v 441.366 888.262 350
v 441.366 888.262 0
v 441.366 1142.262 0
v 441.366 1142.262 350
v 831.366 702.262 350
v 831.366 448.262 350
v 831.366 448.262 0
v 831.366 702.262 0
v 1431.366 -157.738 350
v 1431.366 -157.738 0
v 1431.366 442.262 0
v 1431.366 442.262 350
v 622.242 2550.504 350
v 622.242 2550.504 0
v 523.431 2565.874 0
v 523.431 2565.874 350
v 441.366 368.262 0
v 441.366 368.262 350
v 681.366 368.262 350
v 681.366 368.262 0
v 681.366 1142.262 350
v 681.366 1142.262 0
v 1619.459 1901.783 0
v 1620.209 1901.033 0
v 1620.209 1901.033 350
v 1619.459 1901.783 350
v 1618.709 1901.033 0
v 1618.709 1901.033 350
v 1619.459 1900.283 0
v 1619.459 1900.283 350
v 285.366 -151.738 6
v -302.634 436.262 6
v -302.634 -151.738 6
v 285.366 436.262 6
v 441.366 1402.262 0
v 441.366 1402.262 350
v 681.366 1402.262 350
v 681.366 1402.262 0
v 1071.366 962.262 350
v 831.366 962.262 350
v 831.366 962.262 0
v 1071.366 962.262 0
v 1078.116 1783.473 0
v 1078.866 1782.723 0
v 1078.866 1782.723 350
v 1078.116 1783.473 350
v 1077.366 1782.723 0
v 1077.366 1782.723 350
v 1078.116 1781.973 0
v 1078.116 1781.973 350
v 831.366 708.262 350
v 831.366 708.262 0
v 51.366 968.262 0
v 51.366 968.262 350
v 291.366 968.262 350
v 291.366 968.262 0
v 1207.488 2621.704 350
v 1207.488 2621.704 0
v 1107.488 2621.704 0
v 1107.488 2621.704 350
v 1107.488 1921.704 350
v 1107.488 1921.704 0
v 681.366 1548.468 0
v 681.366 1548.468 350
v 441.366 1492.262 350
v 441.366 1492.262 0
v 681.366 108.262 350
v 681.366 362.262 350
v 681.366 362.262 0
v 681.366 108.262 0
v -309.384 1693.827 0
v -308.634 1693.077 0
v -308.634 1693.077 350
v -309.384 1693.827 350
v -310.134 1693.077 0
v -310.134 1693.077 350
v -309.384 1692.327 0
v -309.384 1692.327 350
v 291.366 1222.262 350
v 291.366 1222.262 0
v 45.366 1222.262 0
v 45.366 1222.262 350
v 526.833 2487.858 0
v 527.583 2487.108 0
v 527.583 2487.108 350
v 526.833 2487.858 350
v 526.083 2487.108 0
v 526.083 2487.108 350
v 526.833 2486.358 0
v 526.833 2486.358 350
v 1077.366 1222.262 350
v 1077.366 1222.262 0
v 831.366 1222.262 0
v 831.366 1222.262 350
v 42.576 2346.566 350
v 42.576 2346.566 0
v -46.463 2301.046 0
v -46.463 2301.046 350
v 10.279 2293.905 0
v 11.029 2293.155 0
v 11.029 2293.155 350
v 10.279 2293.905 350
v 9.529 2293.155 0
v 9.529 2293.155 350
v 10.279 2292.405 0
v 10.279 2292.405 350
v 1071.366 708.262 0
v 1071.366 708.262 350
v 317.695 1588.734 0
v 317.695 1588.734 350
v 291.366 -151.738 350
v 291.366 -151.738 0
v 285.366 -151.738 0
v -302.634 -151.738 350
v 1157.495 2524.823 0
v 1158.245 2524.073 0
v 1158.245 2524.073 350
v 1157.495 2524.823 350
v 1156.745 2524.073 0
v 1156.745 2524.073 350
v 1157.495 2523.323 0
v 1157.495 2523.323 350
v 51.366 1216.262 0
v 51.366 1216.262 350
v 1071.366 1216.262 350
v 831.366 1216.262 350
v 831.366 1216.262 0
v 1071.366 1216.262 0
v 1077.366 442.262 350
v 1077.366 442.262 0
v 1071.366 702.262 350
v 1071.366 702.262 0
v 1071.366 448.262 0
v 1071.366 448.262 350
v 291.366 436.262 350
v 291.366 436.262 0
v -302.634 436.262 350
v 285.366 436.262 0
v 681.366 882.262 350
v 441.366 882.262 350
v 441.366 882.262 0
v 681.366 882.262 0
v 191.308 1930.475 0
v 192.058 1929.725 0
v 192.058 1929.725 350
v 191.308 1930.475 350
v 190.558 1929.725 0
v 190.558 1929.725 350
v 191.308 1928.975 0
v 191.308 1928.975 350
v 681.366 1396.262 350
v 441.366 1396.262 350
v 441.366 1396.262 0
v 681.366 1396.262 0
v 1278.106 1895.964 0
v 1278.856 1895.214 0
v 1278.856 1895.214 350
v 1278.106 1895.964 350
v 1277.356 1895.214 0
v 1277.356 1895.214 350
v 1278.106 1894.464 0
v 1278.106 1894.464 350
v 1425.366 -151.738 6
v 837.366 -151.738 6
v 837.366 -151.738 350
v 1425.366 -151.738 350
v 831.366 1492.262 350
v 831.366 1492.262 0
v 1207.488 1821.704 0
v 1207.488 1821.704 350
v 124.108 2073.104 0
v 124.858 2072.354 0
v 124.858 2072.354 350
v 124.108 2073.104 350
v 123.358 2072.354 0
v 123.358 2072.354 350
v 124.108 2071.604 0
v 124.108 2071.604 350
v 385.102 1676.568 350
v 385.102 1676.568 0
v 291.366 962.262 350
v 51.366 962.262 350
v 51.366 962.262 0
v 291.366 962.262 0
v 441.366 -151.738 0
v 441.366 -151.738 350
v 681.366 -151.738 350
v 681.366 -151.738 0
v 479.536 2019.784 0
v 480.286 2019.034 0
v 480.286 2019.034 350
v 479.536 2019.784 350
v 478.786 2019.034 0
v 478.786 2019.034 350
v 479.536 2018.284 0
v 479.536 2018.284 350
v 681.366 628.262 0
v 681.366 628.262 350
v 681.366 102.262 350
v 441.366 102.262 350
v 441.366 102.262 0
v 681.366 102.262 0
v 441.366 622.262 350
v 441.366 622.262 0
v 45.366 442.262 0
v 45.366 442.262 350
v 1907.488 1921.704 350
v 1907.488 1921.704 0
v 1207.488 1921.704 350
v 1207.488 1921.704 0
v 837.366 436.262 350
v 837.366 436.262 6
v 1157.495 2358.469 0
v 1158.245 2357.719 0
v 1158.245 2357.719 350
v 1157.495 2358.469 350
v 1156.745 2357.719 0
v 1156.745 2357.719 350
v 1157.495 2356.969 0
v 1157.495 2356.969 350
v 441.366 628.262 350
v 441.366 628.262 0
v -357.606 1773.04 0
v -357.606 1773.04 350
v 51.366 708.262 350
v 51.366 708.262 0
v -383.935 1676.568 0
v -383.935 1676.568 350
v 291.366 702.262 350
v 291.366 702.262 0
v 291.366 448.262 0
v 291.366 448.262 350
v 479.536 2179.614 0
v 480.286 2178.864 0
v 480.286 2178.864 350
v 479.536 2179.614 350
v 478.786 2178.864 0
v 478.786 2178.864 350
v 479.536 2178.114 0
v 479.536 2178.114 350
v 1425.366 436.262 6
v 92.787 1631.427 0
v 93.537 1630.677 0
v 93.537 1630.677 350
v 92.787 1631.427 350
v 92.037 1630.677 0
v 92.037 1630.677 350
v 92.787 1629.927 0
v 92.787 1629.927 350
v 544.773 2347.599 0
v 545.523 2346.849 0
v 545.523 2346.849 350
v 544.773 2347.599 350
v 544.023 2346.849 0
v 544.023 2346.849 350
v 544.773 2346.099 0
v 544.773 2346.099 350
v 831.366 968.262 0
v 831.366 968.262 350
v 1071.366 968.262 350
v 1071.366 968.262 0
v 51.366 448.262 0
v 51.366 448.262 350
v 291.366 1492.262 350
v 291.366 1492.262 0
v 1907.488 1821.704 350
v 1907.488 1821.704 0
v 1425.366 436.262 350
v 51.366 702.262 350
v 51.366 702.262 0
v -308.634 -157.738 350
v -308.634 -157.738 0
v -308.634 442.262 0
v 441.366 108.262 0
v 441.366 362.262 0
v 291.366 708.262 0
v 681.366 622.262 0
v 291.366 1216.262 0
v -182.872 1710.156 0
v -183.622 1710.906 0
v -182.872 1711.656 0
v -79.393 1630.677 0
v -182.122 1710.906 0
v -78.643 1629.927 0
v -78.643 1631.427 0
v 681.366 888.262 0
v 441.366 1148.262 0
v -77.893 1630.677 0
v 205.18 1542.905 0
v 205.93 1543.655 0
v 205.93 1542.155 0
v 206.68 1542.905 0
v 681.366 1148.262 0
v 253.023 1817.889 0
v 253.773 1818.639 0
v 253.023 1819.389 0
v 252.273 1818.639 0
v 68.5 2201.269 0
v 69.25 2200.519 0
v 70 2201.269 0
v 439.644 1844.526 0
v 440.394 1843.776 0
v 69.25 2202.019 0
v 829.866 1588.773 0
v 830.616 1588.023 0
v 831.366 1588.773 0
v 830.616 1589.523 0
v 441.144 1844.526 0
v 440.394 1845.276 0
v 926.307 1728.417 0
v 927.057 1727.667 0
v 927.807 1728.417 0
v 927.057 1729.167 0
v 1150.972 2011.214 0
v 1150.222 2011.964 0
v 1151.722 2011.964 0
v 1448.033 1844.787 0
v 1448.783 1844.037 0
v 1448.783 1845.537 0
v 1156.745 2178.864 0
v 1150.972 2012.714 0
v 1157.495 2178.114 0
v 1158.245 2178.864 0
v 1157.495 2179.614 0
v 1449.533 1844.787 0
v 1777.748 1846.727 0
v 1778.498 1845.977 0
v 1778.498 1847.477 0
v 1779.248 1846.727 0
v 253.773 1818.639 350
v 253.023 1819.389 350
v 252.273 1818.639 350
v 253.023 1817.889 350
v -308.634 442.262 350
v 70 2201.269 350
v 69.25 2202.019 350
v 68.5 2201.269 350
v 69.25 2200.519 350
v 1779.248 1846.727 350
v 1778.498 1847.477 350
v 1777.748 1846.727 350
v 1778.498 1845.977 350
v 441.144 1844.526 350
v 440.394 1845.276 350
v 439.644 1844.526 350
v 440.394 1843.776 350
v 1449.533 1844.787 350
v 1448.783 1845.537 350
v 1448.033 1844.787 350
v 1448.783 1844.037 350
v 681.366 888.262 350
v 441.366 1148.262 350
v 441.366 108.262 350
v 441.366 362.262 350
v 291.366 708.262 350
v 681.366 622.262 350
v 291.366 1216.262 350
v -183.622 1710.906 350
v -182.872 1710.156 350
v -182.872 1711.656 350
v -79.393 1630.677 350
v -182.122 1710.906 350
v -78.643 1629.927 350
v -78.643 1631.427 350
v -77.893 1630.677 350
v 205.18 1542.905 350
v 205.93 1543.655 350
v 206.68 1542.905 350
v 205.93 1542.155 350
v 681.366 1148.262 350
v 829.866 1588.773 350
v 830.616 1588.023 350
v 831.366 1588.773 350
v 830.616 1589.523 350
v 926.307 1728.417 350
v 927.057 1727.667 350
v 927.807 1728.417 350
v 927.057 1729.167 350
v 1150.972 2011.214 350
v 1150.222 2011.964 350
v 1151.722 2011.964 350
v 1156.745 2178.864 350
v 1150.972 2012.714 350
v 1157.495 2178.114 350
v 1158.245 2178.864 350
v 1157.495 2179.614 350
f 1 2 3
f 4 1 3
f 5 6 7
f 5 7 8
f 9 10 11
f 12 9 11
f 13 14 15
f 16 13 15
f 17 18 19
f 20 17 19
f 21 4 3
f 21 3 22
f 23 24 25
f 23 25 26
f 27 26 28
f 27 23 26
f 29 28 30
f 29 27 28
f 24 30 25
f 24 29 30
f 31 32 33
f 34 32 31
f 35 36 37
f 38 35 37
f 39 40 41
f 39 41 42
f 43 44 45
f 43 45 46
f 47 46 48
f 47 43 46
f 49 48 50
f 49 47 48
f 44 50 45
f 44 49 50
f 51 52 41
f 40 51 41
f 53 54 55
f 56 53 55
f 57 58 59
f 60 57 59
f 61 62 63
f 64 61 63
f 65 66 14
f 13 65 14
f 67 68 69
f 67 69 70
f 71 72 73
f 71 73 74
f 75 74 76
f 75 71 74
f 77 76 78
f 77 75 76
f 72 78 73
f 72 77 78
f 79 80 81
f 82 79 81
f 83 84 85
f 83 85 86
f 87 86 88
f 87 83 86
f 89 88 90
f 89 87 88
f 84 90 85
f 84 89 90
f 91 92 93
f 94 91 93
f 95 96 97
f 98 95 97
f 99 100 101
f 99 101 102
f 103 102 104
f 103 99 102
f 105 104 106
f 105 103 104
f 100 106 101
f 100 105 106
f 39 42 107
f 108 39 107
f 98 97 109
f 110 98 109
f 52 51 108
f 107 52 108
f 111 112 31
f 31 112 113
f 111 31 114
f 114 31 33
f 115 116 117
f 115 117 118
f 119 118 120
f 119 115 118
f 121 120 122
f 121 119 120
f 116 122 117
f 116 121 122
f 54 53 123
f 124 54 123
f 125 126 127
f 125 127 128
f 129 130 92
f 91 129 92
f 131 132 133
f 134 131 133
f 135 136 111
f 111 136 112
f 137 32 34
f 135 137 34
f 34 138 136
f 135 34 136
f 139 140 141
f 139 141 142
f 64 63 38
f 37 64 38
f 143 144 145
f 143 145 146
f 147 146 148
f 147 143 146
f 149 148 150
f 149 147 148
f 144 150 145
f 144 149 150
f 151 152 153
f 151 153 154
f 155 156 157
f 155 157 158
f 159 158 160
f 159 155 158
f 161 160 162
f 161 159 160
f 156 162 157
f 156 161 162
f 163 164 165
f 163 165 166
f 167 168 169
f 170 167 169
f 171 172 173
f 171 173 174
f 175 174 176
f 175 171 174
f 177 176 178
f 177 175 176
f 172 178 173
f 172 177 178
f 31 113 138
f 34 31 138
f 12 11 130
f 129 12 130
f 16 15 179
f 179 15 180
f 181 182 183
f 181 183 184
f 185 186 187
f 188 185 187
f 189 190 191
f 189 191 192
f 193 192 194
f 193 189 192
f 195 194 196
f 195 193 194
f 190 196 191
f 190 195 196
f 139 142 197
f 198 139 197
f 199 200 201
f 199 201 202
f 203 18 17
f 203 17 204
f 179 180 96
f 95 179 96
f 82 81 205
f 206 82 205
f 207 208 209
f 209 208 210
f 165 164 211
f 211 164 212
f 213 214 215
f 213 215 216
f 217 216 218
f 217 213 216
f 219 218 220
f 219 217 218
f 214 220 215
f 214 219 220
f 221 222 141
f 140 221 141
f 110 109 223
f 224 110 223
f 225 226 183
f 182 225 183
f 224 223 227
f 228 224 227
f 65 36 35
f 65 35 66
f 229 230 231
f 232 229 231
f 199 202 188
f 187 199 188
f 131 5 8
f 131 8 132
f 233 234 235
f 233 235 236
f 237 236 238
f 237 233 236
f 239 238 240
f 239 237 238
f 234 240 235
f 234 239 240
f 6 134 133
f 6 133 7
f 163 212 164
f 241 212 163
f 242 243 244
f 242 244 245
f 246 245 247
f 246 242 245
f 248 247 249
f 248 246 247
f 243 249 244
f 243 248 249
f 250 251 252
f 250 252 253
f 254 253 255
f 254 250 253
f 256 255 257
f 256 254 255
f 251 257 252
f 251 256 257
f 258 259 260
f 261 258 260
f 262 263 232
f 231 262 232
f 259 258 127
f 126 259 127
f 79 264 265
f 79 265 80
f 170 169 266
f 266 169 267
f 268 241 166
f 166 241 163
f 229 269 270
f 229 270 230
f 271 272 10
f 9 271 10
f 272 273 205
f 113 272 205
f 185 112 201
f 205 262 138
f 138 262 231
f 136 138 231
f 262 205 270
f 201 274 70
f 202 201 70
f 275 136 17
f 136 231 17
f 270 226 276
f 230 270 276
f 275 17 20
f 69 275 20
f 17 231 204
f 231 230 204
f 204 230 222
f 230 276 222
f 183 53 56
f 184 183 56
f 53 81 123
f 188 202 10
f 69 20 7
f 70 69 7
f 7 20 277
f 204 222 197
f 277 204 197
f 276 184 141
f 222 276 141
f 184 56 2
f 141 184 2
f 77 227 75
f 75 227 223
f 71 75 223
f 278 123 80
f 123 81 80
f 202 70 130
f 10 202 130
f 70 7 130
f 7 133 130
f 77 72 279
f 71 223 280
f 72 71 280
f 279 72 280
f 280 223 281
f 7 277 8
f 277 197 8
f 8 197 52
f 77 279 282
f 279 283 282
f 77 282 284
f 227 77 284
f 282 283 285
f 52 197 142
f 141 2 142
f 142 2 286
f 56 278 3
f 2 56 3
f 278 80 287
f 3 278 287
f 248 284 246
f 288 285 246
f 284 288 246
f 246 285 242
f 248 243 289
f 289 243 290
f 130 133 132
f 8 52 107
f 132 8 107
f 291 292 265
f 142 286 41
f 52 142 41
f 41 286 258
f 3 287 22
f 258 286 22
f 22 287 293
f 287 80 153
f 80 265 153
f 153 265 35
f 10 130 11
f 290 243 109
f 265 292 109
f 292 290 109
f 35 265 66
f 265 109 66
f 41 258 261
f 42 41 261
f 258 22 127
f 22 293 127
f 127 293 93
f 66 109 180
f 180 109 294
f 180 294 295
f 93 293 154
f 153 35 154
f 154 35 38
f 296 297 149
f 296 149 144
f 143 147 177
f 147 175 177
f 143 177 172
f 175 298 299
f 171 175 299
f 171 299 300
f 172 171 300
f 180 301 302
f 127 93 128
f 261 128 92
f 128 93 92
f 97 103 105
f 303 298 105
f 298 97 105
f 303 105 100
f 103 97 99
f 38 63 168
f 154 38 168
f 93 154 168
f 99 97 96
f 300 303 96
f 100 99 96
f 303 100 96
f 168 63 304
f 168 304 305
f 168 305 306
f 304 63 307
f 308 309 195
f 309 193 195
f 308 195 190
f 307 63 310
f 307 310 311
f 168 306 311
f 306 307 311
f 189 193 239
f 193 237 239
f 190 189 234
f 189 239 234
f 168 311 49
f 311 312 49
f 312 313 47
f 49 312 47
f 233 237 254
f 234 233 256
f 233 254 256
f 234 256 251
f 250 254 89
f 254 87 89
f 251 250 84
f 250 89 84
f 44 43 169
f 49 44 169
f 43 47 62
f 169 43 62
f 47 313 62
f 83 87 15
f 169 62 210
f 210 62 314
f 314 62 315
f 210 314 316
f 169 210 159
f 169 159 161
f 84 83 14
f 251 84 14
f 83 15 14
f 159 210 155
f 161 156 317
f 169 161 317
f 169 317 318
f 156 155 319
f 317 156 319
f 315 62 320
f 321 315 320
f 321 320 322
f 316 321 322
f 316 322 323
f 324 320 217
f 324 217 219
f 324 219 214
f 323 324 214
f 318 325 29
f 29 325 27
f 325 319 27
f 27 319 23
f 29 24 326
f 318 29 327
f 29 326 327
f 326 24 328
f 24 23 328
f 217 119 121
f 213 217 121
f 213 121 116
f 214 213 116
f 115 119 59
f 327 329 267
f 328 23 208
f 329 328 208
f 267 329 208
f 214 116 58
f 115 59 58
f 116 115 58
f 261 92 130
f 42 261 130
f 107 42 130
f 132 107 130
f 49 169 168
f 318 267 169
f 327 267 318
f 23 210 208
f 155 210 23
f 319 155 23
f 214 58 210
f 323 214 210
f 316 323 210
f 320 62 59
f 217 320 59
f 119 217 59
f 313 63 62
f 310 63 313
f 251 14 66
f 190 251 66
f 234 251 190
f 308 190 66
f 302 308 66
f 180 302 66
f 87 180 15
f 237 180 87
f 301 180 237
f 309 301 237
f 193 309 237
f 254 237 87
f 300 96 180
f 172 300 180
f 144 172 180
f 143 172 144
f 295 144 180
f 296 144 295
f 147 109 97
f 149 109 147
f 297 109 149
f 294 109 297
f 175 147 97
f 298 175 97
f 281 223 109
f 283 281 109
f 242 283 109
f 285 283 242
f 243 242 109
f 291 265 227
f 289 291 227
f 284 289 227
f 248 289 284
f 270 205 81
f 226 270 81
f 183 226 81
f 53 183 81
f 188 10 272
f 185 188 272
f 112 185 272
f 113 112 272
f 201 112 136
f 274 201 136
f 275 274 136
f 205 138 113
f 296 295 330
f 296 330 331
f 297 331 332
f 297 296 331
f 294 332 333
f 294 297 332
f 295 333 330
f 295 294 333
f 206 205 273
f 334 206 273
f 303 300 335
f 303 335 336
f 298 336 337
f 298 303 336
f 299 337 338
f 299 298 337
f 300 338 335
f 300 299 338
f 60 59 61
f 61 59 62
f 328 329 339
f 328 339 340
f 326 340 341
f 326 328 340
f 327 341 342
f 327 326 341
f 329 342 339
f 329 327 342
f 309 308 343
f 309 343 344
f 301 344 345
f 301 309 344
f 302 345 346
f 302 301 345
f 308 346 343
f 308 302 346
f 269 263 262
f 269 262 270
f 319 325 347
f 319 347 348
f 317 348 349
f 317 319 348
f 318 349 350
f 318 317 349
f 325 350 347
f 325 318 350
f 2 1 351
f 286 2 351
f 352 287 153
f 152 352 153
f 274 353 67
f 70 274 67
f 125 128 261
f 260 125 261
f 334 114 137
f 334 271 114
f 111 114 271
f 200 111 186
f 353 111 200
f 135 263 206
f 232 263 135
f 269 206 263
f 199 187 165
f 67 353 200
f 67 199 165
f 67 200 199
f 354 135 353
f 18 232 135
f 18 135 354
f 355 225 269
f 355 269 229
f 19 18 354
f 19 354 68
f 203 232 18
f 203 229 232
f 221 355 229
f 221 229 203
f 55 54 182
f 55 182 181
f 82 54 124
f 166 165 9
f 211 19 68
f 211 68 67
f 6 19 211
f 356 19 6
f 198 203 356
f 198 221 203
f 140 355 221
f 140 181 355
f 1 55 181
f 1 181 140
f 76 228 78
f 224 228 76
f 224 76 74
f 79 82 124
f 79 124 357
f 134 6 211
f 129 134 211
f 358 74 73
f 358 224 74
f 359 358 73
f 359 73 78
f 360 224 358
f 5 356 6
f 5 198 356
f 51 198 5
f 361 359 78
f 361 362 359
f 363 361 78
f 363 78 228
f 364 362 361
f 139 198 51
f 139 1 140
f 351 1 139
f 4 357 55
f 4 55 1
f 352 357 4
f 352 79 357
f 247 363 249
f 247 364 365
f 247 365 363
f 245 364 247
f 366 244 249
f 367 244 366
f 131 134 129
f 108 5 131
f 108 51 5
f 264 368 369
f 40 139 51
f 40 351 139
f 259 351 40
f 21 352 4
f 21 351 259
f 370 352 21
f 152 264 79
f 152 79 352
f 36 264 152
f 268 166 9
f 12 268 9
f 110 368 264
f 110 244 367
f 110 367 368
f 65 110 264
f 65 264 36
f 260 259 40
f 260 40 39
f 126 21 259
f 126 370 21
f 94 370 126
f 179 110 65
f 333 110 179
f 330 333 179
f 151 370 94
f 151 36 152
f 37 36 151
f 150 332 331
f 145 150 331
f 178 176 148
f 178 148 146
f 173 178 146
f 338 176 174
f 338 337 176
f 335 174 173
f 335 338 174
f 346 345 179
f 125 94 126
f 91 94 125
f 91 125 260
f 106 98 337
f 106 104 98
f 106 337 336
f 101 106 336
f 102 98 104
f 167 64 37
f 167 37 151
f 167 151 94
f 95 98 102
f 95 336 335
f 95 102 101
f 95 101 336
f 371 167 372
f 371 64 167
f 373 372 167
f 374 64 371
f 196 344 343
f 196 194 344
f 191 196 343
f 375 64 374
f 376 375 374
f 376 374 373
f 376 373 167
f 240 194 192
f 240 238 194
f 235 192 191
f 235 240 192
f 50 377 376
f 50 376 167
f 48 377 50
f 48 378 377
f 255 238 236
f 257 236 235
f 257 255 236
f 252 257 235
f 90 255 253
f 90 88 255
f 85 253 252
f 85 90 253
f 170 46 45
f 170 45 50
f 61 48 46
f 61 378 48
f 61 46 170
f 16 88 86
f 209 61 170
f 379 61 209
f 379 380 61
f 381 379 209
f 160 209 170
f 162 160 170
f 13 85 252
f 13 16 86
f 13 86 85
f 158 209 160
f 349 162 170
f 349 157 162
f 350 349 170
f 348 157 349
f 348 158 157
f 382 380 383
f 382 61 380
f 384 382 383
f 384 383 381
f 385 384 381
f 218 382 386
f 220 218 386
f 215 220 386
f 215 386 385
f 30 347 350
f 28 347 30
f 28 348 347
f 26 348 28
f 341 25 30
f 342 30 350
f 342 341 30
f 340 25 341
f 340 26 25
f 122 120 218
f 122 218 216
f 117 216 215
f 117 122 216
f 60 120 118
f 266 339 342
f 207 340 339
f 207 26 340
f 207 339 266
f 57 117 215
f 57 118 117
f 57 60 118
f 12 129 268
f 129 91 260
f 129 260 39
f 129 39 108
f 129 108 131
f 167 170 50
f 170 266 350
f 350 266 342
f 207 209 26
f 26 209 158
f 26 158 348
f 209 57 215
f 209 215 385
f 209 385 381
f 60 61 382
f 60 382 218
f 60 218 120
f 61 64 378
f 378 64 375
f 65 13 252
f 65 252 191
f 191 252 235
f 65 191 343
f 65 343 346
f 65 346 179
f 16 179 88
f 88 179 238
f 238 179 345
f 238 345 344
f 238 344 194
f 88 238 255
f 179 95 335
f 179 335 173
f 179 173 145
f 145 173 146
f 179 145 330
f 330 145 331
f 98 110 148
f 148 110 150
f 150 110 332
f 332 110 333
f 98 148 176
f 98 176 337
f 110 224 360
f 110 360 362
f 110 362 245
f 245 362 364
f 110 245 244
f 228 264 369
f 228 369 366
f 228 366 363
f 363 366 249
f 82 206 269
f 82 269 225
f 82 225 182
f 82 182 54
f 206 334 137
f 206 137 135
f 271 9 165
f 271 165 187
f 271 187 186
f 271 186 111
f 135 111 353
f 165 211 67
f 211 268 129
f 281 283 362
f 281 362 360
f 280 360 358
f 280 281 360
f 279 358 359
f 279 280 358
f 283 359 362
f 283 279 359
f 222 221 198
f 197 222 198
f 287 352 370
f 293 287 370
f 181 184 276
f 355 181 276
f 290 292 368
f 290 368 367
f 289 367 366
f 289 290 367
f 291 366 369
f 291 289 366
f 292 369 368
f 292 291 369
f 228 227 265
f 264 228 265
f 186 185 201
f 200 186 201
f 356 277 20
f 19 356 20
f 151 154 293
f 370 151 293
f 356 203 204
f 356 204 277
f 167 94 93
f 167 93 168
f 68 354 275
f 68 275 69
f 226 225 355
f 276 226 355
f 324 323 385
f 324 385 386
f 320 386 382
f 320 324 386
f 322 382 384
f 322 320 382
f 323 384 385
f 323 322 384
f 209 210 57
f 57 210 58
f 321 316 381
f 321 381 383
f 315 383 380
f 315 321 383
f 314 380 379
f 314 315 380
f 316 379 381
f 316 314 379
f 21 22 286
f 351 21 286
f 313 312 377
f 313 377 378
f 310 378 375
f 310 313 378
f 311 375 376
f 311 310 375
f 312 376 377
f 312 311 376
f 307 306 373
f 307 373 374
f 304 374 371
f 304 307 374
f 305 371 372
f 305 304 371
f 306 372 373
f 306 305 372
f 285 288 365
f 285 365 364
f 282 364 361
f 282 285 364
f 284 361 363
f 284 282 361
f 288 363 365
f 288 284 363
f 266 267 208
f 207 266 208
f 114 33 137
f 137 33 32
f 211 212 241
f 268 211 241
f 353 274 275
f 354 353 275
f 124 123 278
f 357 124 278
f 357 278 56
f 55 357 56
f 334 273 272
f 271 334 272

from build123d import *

# Parameters (mm, degrees)
F0_W     = 588
F0_H     = 6
F0_W_2   = 240
F0_R     = 0.75
F1_DEPTH = 350
F0_H_2   = 588
F2_DEPTH = 6


with BuildPart() as f1:
    # F0 (on Top) → F1 (new body)
    with BuildSketch(Plane.XY):
        with Locations((1131.3658022881, -154.7376276255)):
            Rectangle(F0_W, F0_H)
        Polygon((831.3658022881, 442.2623723745), (831.3658022881, -157.7376276255), (837.3658022881, -157.7376276255), (837.3658022881, -151.7376276255), (837.3658022881, 436.2623723745), (837.3658022881, 442.2623723745), align=None)
        Polygon((285.3658022881, 436.2623723745), (291.3658022881, 436.2623723745), (291.3658022881, 442.2623723745), (51.3658022881, 442.2623723745), (45.3658022881, 442.2623723745), (-302.6341977119, 442.2623723745), (-302.6341977119, 436.2623723745), align=None)
        with Locations((951.3658022881, 1219.2623723745)):
            Rectangle(F0_W_2, F0_H)
        Polygon((-308.6341977119, -157.7376276255), (-302.6341977119, -157.7376276255), (-302.6341977119, -151.7376276255), (-302.6341977119, 436.2623723745), (-302.6341977119, 442.2623723745), (-308.6341977119, 442.2623723745), align=None)
        Polygon((-302.6341977119, -157.7376276255), (291.3658022881, -157.7376276255), (291.3658022881, -151.7376276255), (285.3658022881, -151.7376276255), (-302.6341977119, -151.7376276255), align=None)
        Polygon((1071.3658022881, 442.2623723745), (837.3658022881, 442.2623723745), (837.3658022881, 436.2623723745), (1425.3658022881, 436.2623723745), (1431.3658022881, 436.2623723745), (1431.3658022881, 442.2623723745), (1077.3658022881, 442.2623723745), align=None)
        Polygon((291.3658022881, -151.7376276255), (291.3658022881, -157.7376276255), (441.3658022881, -157.7376276255), (441.3658022881, -151.7376276255), (441.3658022881, 102.2623723745), (441.3658022881, 108.2623723745), (441.3658022881, 362.2623723745), (441.3658022881, 368.2623723745), (441.3658022881, 622.2623723745), (441.3658022881, 628.2623723745), (441.3658022881, 882.2623723745), (441.3658022881, 888.2623723745), (441.3658022881, 1142.2623723745), (441.3658022881, 1148.2623723745), (441.3658022881, 1396.2623723745), (441.3658022881, 1402.2623723745), (441.3658022881, 1492.2623723745), (291.3658022881, 1492.2623723745), (291.3658022881, 1222.2623723745), (291.3658022881, 1216.2623723745), (291.3658022881, 968.2623723745), (291.3658022881, 962.2623723745), (291.3658022881, 708.2623723745), (291.3658022881, 702.2623723745), (291.3658022881, 448.2623723745), (291.3658022881, 442.2623723745), (291.3658022881, 436.2623723745), align=None)
        with Locations((171.3658022881, 1219.2623723745)):
            Rectangle(F0_W_2, F0_H)
        Polygon((1425.3658022881, -151.7376276255), (1425.3658022881, -157.7376276255), (1431.3658022881, -157.7376276255), (1431.3658022881, 436.2623723745), (1425.3658022881, 436.2623723745), align=None)
        with Locations((561.3658022881, -154.7376276255)):
            Rectangle(F0_W_2, F0_H)
        Polygon((681.3658022881, -151.7376276255), (681.3658022881, -157.7376276255), (831.3658022881, -157.7376276255), (831.3658022881, 442.2623723745), (831.3658022881, 448.2623723745), (831.3658022881, 702.2623723745), (831.3658022881, 708.2623723745), (831.3658022881, 962.2623723745), (831.3658022881, 968.2623723745), (831.3658022881, 1216.2623723745), (831.3658022881, 1222.2623723745), (831.3658022881, 1492.2623723745), (681.3658022881, 1492.2623723745), (681.3658022881, 1402.2623723745), (681.3658022881, 1396.2623723745), (681.3658022881, 1148.2623723745), (681.3658022881, 1142.2623723745), (681.3658022881, 888.2623723745), (681.3658022881, 882.2623723745), (681.3658022881, 628.2623723745), (681.3658022881, 622.2623723745), (681.3658022881, 368.2623723745), (681.3658022881, 362.2623723745), (681.3658022881, 108.2623723745), (681.3658022881, 102.2623723745), (681.3658022881, 7.2623723745), align=None)
        Polygon((-383.9351642411, 1676.5681091402), (291.3658022881, 1492.2623723745), (441.3658022881, 1492.2623723745), (622.2423832578, 2550.5042054476), (523.4306083625, 2565.8740831976), (385.101708613, 1676.5681091402), (42.5764871887, 2346.5661747919), (-46.4625771205, 2301.046453495), (317.6951932546, 1588.7339390216), (-357.6057732746, 1773.0396757873), align=None)
        with Locations((-309.3841977119, 1693.0772066116)):
            Circle(F0_R, mode=Mode.SUBTRACT)
        with Locations((-182.871773839, 1710.9059095383)):
            Circle(F0_R, mode=Mode.SUBTRACT)
        with Locations((-78.6427035928, 1630.676984787)):
            Circle(F0_R, mode=Mode.SUBTRACT)
        with Locations((92.7866697311, 1630.676984787)):
            Circle(F0_R, mode=Mode.SUBTRACT)
        with Locations((205.9300839901, 1542.9050922394)):
            Circle(F0_R, mode=Mode.SUBTRACT)
        with Locations((253.0225515366, 1818.6388015747)):
            Circle(F0_R, mode=Mode.SUBTRACT)
        with Locations((440.3941631317, 1844.5258140564)):
            Circle(F0_R, mode=Mode.SUBTRACT)
        with Locations((124.1076514125, 2072.3543167114)):
            Circle(F0_R, mode=Mode.SUBTRACT)
        with Locations((69.2502483726, 2201.2691497803)):
            Circle(F0_R, mode=Mode.SUBTRACT)
        with Locations((10.2785266936, 2293.1554317474)):
            Circle(F0_R, mode=Mode.SUBTRACT)
        with Locations((191.3079619408, 1929.7250509262)):
            Circle(F0_R, mode=Mode.SUBTRACT)
        with Locations((479.5362651348, 2019.0343856812)):
            Circle(F0_R, mode=Mode.SUBTRACT)
        with Locations((479.5362651348, 2178.8644790649)):
            Circle(F0_R, mode=Mode.SUBTRACT)
        with Locations((544.7731018066, 2346.8494415283)):
            Circle(F0_R, mode=Mode.SUBTRACT)
        with Locations((526.8329381943, 2487.1084690094)):
            Circle(F0_R, mode=Mode.SUBTRACT)
        Polygon((1071.3658022881, 702.2623723745), (1071.3658022881, 448.2623723745), (1071.3658022881, 442.2623723745), (1077.3658022881, 442.2623723745), (1077.3658022881, 1222.2623723745), (1071.3658022881, 1222.2623723745), (1071.3658022881, 1216.2623723745), (1071.3658022881, 968.2623723745), (1071.3658022881, 962.2623723745), (1071.3658022881, 708.2623723745), align=None)
        Polygon((681.3658022881, 1492.2623723745), (831.3658022881, 1492.2623723745), (1207.488313467, 1821.7041071084), (1907.488313467, 1821.7041071084), (1907.488313467, 1921.7041071084), (1207.488313467, 1921.7041071084), (1207.488313467, 2621.7041071084), (1107.488313467, 2621.7041071084), (1107.488313467, 1921.7041071084), (681.3658022881, 1548.4679005014), align=None)
        with Locations((830.6158022881, 1588.7731313705)):
            Circle(F0_R, mode=Mode.SUBTRACT)
        with Locations((927.0566105843, 1728.4172773361)):
            Circle(F0_R, mode=Mode.SUBTRACT)
        with Locations((1078.1158022881, 1782.7233076096)):
            Circle(F0_R, mode=Mode.SUBTRACT)
        with Locations((1278.1064510345, 1895.2144384384)):
            Circle(F0_R, mode=Mode.SUBTRACT)
        with Locations((1448.7826824188, 1844.7873592377)):
            Circle(F0_R, mode=Mode.SUBTRACT)
        with Locations((1619.4587945938, 1901.0329246521)):
            Circle(F0_R, mode=Mode.SUBTRACT)
        with Locations((1778.4979343414, 1846.7268943787)):
            Circle(F0_R, mode=Mode.SUBTRACT)
        with Locations((1150.971531868, 2011.9640827179)):
            Circle(F0_R, mode=Mode.SUBTRACT)
        with Locations((1157.4952602386, 2178.8644790649)):
            Circle(F0_R, mode=Mode.SUBTRACT)
        with Locations((1157.4952602386, 2357.7191829681)):
            Circle(F0_R, mode=Mode.SUBTRACT)
        with Locations((1157.4952602386, 2524.0731239319)):
            Circle(F0_R, mode=Mode.SUBTRACT)
        Polygon((45.3658022881, 442.2623723745), (51.3658022881, 442.2623723745), (51.3658022881, 448.2623723745), (51.3658022881, 702.2623723745), (51.3658022881, 708.2623723745), (51.3658022881, 962.2623723745), (51.3658022881, 968.2623723745), (51.3658022881, 1216.2623723745), (51.3658022881, 1222.2623723745), (45.3658022881, 1222.2623723745), align=None)
        with Locations((561.3658022881, 1399.2623723745)):
            Rectangle(F0_W_2, F0_H)
        with Locations((951.3658022881, 965.2623723745)):
            Rectangle(F0_W_2, F0_H)
        with Locations((561.3658022881, 1145.2623723745)):
            Rectangle(F0_W_2, F0_H)
        with Locations((561.3658022881, 885.2623723745)):
            Rectangle(F0_W_2, F0_H)
        with Locations((561.3658022881, 625.2623723745)):
            Rectangle(F0_W_2, F0_H)
        with Locations((951.3658022881, 705.2623723745)):
            Rectangle(F0_W_2, F0_H)
        with Locations((561.3658022881, 365.2623723745)):
            Rectangle(F0_W_2, F0_H)
        Polygon((831.3658022881, 448.2623723745), (831.3658022881, 442.2623723745), (837.3658022881, 442.2623723745), (1071.3658022881, 442.2623723745), (1071.3658022881, 448.2623723745), align=None)
        with Locations((561.3658022881, 105.2623723745)):
            Rectangle(F0_W_2, F0_H)
        with Locations((171.3658022881, 705.2623723745)):
            Rectangle(F0_W_2, F0_H)
        with Locations((171.3658022881, 445.2623723745)):
            Rectangle(F0_W_2, F0_H)
        with Locations((171.3658022881, 965.2623723745)):
            Rectangle(F0_W_2, F0_H)
    extrude(amount=F1_DEPTH)

    # F0 (on Top) → F2 (join)
    with BuildSketch(Plane.XY):
        with Locations((1131.3658022881, -154.7376276255)):
            Rectangle(F0_W, F0_H)
        Polygon((831.3658022881, 442.2623723745), (831.3658022881, -157.7376276255), (837.3658022881, -157.7376276255), (837.3658022881, -151.7376276255), (837.3658022881, 436.2623723745), (837.3658022881, 442.2623723745), align=None)
        Polygon((285.3658022881, 436.2623723745), (291.3658022881, 436.2623723745), (291.3658022881, 442.2623723745), (51.3658022881, 442.2623723745), (45.3658022881, 442.2623723745), (-302.6341977119, 442.2623723745), (-302.6341977119, 436.2623723745), align=None)
        with Locations((951.3658022881, 1219.2623723745)):
            Rectangle(F0_W_2, F0_H)
        Polygon((-308.6341977119, -157.7376276255), (-302.6341977119, -157.7376276255), (-302.6341977119, -151.7376276255), (-302.6341977119, 436.2623723745), (-302.6341977119, 442.2623723745), (-308.6341977119, 442.2623723745), align=None)
        Polygon((-302.6341977119, -157.7376276255), (291.3658022881, -157.7376276255), (291.3658022881, -151.7376276255), (285.3658022881, -151.7376276255), (-302.6341977119, -151.7376276255), align=None)
        Polygon((1071.3658022881, 442.2623723745), (837.3658022881, 442.2623723745), (837.3658022881, 436.2623723745), (1425.3658022881, 436.2623723745), (1431.3658022881, 436.2623723745), (1431.3658022881, 442.2623723745), (1077.3658022881, 442.2623723745), align=None)
        Polygon((291.3658022881, -151.7376276255), (291.3658022881, -157.7376276255), (441.3658022881, -157.7376276255), (441.3658022881, -151.7376276255), (441.3658022881, 102.2623723745), (441.3658022881, 108.2623723745), (441.3658022881, 362.2623723745), (441.3658022881, 368.2623723745), (441.3658022881, 622.2623723745), (441.3658022881, 628.2623723745), (441.3658022881, 882.2623723745), (441.3658022881, 888.2623723745), (441.3658022881, 1142.2623723745), (441.3658022881, 1148.2623723745), (441.3658022881, 1396.2623723745), (441.3658022881, 1402.2623723745), (441.3658022881, 1492.2623723745), (291.3658022881, 1492.2623723745), (291.3658022881, 1222.2623723745), (291.3658022881, 1216.2623723745), (291.3658022881, 968.2623723745), (291.3658022881, 962.2623723745), (291.3658022881, 708.2623723745), (291.3658022881, 702.2623723745), (291.3658022881, 448.2623723745), (291.3658022881, 442.2623723745), (291.3658022881, 436.2623723745), align=None)
        with Locations((171.3658022881, 1219.2623723745)):
            Rectangle(F0_W_2, F0_H)
        Polygon((1425.3658022881, -151.7376276255), (1425.3658022881, -157.7376276255), (1431.3658022881, -157.7376276255), (1431.3658022881, 436.2623723745), (1425.3658022881, 436.2623723745), align=None)
        with Locations((561.3658022881, -154.7376276255)):
            Rectangle(F0_W_2, F0_H)
        Polygon((681.3658022881, -151.7376276255), (681.3658022881, -157.7376276255), (831.3658022881, -157.7376276255), (831.3658022881, 442.2623723745), (831.3658022881, 448.2623723745), (831.3658022881, 702.2623723745), (831.3658022881, 708.2623723745), (831.3658022881, 962.2623723745), (831.3658022881, 968.2623723745), (831.3658022881, 1216.2623723745), (831.3658022881, 1222.2623723745), (831.3658022881, 1492.2623723745), (681.3658022881, 1492.2623723745), (681.3658022881, 1402.2623723745), (681.3658022881, 1396.2623723745), (681.3658022881, 1148.2623723745), (681.3658022881, 1142.2623723745), (681.3658022881, 888.2623723745), (681.3658022881, 882.2623723745), (681.3658022881, 628.2623723745), (681.3658022881, 622.2623723745), (681.3658022881, 368.2623723745), (681.3658022881, 362.2623723745), (681.3658022881, 108.2623723745), (681.3658022881, 102.2623723745), (681.3658022881, 7.2623723745), align=None)
        Polygon((-383.9351642411, 1676.5681091402), (291.3658022881, 1492.2623723745), (441.3658022881, 1492.2623723745), (622.2423832578, 2550.5042054476), (523.4306083625, 2565.8740831976), (385.101708613, 1676.5681091402), (42.5764871887, 2346.5661747919), (-46.4625771205, 2301.046453495), (317.6951932546, 1588.7339390216), (-357.6057732746, 1773.0396757873), align=None)
        with Locations((-309.3841977119, 1693.0772066116)):
            Circle(F0_R, mode=Mode.SUBTRACT)
        with Locations((-182.871773839, 1710.9059095383)):
            Circle(F0_R, mode=Mode.SUBTRACT)
        with Locations((-78.6427035928, 1630.676984787)):
            Circle(F0_R, mode=Mode.SUBTRACT)
        with Locations((92.7866697311, 1630.676984787)):
            Circle(F0_R, mode=Mode.SUBTRACT)
        with Locations((205.9300839901, 1542.9050922394)):
            Circle(F0_R, mode=Mode.SUBTRACT)
        with Locations((253.0225515366, 1818.6388015747)):
            Circle(F0_R, mode=Mode.SUBTRACT)
        with Locations((440.3941631317, 1844.5258140564)):
            Circle(F0_R, mode=Mode.SUBTRACT)
        with Locations((124.1076514125, 2072.3543167114)):
            Circle(F0_R, mode=Mode.SUBTRACT)
        with Locations((69.2502483726, 2201.2691497803)):
            Circle(F0_R, mode=Mode.SUBTRACT)
        with Locations((10.2785266936, 2293.1554317474)):
            Circle(F0_R, mode=Mode.SUBTRACT)
        with Locations((191.3079619408, 1929.7250509262)):
            Circle(F0_R, mode=Mode.SUBTRACT)
        with Locations((479.5362651348, 2019.0343856812)):
            Circle(F0_R, mode=Mode.SUBTRACT)
        with Locations((479.5362651348, 2178.8644790649)):
            Circle(F0_R, mode=Mode.SUBTRACT)
        with Locations((544.7731018066, 2346.8494415283)):
            Circle(F0_R, mode=Mode.SUBTRACT)
        with Locations((526.8329381943, 2487.1084690094)):
            Circle(F0_R, mode=Mode.SUBTRACT)
        Polygon((1071.3658022881, 702.2623723745), (1071.3658022881, 448.2623723745), (1071.3658022881, 442.2623723745), (1077.3658022881, 442.2623723745), (1077.3658022881, 1222.2623723745), (1071.3658022881, 1222.2623723745), (1071.3658022881, 1216.2623723745), (1071.3658022881, 968.2623723745), (1071.3658022881, 962.2623723745), (1071.3658022881, 708.2623723745), align=None)
        Polygon((681.3658022881, 1492.2623723745), (831.3658022881, 1492.2623723745), (1207.488313467, 1821.7041071084), (1907.488313467, 1821.7041071084), (1907.488313467, 1921.7041071084), (1207.488313467, 1921.7041071084), (1207.488313467, 2621.7041071084), (1107.488313467, 2621.7041071084), (1107.488313467, 1921.7041071084), (681.3658022881, 1548.4679005014), align=None)
        with Locations((830.6158022881, 1588.7731313705)):
            Circle(F0_R, mode=Mode.SUBTRACT)
        with Locations((927.0566105843, 1728.4172773361)):
            Circle(F0_R, mode=Mode.SUBTRACT)
        with Locations((1078.1158022881, 1782.7233076096)):
            Circle(F0_R, mode=Mode.SUBTRACT)
        with Locations((1278.1064510345, 1895.2144384384)):
            Circle(F0_R, mode=Mode.SUBTRACT)
        with Locations((1448.7826824188, 1844.7873592377)):
            Circle(F0_R, mode=Mode.SUBTRACT)
        with Locations((1619.4587945938, 1901.0329246521)):
            Circle(F0_R, mode=Mode.SUBTRACT)
        with Locations((1778.4979343414, 1846.7268943787)):
            Circle(F0_R, mode=Mode.SUBTRACT)
        with Locations((1150.971531868, 2011.9640827179)):
            Circle(F0_R, mode=Mode.SUBTRACT)
        with Locations((1157.4952602386, 2178.8644790649)):
            Circle(F0_R, mode=Mode.SUBTRACT)
        with Locations((1157.4952602386, 2357.7191829681)):
            Circle(F0_R, mode=Mode.SUBTRACT)
        with Locations((1157.4952602386, 2524.0731239319)):
            Circle(F0_R, mode=Mode.SUBTRACT)
        Polygon((45.3658022881, 442.2623723745), (51.3658022881, 442.2623723745), (51.3658022881, 448.2623723745), (51.3658022881, 702.2623723745), (51.3658022881, 708.2623723745), (51.3658022881, 962.2623723745), (51.3658022881, 968.2623723745), (51.3658022881, 1216.2623723745), (51.3658022881, 1222.2623723745), (45.3658022881, 1222.2623723745), align=None)
        with Locations((561.3658022881, 1399.2623723745)):
            Rectangle(F0_W_2, F0_H)
        with Locations((-8.6341977119, 142.2623723745)):
            Rectangle(F0_W, F0_H_2)
        with Locations((1131.3658022881, 142.2623723745)):
            Rectangle(F0_W, F0_H_2)
    extrude(amount=F2_DEPTH)


solid = f1.part
